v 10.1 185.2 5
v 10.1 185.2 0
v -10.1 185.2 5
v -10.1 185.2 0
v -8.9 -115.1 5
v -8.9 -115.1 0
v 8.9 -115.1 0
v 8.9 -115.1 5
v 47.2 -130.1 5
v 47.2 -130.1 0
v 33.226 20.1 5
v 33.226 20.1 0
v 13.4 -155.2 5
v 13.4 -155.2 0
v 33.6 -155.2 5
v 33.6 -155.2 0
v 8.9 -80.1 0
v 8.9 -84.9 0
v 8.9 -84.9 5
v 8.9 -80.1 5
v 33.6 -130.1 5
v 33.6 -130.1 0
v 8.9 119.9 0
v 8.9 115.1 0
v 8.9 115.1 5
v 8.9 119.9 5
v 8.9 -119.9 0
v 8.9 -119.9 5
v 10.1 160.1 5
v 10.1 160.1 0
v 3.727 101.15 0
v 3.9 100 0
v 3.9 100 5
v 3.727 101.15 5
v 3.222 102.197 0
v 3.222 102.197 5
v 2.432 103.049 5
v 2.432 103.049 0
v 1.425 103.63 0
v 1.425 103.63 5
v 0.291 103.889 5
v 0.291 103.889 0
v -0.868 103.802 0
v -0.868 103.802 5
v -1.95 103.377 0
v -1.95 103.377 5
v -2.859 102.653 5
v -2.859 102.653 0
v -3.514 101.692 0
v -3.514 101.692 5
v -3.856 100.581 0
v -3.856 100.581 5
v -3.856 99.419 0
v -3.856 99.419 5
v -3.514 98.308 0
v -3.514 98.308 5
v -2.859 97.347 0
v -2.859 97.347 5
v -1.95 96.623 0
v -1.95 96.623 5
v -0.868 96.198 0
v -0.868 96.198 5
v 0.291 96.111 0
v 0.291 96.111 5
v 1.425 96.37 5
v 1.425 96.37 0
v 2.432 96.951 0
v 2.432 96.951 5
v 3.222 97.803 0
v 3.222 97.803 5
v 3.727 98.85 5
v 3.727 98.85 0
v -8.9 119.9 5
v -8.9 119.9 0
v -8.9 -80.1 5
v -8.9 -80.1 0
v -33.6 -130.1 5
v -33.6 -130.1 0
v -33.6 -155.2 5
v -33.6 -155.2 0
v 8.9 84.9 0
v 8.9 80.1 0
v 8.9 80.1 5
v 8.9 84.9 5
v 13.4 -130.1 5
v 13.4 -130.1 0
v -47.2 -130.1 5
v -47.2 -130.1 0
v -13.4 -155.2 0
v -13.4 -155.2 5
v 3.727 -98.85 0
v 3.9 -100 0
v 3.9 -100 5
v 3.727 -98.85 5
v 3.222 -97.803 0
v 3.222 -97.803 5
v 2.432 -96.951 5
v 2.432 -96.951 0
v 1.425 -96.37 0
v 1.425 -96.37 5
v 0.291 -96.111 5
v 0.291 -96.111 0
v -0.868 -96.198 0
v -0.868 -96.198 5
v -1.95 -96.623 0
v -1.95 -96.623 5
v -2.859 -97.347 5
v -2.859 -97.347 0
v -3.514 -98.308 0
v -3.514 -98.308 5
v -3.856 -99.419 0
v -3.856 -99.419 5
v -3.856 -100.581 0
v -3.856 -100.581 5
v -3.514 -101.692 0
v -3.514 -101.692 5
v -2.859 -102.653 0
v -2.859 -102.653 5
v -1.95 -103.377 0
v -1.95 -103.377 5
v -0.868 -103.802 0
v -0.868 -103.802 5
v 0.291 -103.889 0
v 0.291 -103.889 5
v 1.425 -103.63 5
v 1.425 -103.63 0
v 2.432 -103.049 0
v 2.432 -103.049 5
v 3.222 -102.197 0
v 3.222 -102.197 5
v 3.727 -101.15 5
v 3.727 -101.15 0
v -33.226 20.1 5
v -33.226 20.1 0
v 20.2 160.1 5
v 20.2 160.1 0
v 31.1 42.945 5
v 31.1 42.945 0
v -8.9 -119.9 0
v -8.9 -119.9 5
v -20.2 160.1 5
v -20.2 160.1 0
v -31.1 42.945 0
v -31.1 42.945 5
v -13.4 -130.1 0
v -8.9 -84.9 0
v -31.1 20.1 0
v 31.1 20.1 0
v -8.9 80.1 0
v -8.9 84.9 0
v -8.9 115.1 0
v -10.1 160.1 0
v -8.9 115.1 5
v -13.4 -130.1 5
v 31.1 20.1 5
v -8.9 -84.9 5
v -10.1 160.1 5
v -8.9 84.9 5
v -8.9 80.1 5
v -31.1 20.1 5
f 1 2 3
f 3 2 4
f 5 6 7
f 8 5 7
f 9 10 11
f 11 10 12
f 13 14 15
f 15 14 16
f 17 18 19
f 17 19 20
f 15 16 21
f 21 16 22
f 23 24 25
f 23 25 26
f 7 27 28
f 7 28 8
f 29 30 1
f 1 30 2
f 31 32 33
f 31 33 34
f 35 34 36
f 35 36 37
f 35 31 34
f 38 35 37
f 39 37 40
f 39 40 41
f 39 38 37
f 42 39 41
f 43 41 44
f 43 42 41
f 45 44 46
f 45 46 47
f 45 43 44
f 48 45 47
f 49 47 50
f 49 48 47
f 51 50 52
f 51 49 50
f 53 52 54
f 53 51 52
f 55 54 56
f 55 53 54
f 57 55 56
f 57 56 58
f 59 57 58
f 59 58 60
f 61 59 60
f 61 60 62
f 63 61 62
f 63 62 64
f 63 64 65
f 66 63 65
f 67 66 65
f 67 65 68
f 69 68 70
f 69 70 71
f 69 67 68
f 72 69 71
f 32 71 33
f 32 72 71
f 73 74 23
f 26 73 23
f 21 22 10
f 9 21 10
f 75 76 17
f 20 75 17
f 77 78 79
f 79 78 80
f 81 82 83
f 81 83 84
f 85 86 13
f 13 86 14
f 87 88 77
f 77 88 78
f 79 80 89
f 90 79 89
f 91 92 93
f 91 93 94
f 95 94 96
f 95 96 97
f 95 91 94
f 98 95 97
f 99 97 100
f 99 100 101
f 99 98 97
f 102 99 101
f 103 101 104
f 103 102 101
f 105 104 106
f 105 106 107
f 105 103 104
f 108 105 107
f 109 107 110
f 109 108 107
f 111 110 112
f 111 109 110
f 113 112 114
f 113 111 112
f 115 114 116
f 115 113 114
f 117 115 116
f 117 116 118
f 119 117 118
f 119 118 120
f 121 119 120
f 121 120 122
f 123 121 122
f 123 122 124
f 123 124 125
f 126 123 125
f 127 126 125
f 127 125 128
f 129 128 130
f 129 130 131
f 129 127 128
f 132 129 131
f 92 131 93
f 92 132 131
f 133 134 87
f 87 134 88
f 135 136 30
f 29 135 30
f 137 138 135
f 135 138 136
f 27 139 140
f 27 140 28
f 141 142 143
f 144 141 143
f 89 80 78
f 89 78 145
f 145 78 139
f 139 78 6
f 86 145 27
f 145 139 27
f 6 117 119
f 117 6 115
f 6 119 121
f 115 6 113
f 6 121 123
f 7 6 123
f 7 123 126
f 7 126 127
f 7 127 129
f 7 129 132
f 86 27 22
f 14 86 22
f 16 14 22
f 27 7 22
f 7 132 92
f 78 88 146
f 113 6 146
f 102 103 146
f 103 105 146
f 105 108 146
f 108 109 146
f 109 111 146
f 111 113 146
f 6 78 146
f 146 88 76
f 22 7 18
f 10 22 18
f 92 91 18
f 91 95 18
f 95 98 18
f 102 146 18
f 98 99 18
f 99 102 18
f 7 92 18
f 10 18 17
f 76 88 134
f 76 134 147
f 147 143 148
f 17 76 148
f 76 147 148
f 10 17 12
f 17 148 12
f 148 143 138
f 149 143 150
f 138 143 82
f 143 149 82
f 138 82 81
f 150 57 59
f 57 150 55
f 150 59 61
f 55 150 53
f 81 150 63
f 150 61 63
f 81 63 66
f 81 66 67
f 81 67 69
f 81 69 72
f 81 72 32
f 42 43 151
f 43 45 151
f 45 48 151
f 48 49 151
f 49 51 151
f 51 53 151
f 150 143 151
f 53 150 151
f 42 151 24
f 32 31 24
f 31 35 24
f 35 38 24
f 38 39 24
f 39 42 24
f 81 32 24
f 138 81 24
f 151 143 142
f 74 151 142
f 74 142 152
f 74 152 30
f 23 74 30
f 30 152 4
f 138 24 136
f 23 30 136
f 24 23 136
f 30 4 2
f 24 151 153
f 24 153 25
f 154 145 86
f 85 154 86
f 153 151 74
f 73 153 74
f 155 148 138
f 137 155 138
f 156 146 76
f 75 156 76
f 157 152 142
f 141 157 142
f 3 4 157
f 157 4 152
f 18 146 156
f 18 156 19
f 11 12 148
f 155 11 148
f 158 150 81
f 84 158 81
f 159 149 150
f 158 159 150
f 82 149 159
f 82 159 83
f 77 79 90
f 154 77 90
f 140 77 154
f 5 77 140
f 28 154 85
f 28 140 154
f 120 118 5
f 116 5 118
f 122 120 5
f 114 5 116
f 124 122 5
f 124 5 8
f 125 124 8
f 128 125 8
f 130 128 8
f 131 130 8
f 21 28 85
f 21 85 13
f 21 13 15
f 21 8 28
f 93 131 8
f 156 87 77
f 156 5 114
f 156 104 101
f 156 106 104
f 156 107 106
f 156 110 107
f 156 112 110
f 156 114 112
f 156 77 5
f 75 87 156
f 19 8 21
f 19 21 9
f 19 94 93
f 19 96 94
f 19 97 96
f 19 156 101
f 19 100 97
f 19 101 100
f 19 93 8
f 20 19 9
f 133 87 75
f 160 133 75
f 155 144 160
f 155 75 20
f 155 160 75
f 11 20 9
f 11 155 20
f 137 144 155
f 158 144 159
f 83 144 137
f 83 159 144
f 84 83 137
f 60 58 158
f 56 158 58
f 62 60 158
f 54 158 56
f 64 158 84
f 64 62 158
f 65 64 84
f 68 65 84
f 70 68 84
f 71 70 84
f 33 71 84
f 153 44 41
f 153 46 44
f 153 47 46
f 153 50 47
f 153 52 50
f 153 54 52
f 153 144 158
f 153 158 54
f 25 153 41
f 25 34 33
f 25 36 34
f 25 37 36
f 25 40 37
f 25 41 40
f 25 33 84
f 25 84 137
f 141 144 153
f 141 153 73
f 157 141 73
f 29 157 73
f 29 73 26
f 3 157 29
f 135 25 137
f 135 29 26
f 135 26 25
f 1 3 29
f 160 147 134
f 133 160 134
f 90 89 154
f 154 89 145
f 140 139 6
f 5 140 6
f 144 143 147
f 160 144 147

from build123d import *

# Parameters (mm, degrees)
SKETCH010_R  = 3.9
SKETCH010_W  = 17.8
SKETCH010_H  = 4.8
PAD010_DEPTH = 5


with BuildPart() as part:
    # Sketch010 → Pad010 (new body)
    with BuildSketch(Plane.XY):
        Polygon((-10.1, 160.1), (-20.2, 160.1), (-31.1, 42.945185), (-31.1, 20.1), (-33.2255, 20.1), (-47.2, -130.1), (-33.6, -130.1), (-33.6, -155.2), (-13.4, -155.2), (-13.4, -130.1), (13.4, -130.1), (13.4, -155.2), (33.6, -155.2), (33.6, -130.1), (47.2, -130.1), (33.2255, 20.1), (31.1, 20.1), (31.1, 42.945185), (20.2, 160.1), (10.1, 160.1), (10.1, 185.2), (-10.1, 185.2), align=None)
        with Locations((0, -100)):
            Circle(SKETCH010_R, mode=Mode.SUBTRACT)
        with Locations((0, 100)):
            Circle(SKETCH010_R, mode=Mode.SUBTRACT)
        with Locations((0, 117.5)):
            Rectangle(SKETCH010_W, SKETCH010_H, mode=Mode.SUBTRACT)
        with Locations((0, 82.5)):
            Rectangle(SKETCH010_W, SKETCH010_H, mode=Mode.SUBTRACT)
        with Locations((0, -117.5)):
            Rectangle(SKETCH010_W, SKETCH010_H, mode=Mode.SUBTRACT)
        with Locations((0, -82.5)):
            Rectangle(SKETCH010_W, SKETCH010_H, mode=Mode.SUBTRACT)
    extrude(amount=PAD010_DEPTH)


solid = part.part
